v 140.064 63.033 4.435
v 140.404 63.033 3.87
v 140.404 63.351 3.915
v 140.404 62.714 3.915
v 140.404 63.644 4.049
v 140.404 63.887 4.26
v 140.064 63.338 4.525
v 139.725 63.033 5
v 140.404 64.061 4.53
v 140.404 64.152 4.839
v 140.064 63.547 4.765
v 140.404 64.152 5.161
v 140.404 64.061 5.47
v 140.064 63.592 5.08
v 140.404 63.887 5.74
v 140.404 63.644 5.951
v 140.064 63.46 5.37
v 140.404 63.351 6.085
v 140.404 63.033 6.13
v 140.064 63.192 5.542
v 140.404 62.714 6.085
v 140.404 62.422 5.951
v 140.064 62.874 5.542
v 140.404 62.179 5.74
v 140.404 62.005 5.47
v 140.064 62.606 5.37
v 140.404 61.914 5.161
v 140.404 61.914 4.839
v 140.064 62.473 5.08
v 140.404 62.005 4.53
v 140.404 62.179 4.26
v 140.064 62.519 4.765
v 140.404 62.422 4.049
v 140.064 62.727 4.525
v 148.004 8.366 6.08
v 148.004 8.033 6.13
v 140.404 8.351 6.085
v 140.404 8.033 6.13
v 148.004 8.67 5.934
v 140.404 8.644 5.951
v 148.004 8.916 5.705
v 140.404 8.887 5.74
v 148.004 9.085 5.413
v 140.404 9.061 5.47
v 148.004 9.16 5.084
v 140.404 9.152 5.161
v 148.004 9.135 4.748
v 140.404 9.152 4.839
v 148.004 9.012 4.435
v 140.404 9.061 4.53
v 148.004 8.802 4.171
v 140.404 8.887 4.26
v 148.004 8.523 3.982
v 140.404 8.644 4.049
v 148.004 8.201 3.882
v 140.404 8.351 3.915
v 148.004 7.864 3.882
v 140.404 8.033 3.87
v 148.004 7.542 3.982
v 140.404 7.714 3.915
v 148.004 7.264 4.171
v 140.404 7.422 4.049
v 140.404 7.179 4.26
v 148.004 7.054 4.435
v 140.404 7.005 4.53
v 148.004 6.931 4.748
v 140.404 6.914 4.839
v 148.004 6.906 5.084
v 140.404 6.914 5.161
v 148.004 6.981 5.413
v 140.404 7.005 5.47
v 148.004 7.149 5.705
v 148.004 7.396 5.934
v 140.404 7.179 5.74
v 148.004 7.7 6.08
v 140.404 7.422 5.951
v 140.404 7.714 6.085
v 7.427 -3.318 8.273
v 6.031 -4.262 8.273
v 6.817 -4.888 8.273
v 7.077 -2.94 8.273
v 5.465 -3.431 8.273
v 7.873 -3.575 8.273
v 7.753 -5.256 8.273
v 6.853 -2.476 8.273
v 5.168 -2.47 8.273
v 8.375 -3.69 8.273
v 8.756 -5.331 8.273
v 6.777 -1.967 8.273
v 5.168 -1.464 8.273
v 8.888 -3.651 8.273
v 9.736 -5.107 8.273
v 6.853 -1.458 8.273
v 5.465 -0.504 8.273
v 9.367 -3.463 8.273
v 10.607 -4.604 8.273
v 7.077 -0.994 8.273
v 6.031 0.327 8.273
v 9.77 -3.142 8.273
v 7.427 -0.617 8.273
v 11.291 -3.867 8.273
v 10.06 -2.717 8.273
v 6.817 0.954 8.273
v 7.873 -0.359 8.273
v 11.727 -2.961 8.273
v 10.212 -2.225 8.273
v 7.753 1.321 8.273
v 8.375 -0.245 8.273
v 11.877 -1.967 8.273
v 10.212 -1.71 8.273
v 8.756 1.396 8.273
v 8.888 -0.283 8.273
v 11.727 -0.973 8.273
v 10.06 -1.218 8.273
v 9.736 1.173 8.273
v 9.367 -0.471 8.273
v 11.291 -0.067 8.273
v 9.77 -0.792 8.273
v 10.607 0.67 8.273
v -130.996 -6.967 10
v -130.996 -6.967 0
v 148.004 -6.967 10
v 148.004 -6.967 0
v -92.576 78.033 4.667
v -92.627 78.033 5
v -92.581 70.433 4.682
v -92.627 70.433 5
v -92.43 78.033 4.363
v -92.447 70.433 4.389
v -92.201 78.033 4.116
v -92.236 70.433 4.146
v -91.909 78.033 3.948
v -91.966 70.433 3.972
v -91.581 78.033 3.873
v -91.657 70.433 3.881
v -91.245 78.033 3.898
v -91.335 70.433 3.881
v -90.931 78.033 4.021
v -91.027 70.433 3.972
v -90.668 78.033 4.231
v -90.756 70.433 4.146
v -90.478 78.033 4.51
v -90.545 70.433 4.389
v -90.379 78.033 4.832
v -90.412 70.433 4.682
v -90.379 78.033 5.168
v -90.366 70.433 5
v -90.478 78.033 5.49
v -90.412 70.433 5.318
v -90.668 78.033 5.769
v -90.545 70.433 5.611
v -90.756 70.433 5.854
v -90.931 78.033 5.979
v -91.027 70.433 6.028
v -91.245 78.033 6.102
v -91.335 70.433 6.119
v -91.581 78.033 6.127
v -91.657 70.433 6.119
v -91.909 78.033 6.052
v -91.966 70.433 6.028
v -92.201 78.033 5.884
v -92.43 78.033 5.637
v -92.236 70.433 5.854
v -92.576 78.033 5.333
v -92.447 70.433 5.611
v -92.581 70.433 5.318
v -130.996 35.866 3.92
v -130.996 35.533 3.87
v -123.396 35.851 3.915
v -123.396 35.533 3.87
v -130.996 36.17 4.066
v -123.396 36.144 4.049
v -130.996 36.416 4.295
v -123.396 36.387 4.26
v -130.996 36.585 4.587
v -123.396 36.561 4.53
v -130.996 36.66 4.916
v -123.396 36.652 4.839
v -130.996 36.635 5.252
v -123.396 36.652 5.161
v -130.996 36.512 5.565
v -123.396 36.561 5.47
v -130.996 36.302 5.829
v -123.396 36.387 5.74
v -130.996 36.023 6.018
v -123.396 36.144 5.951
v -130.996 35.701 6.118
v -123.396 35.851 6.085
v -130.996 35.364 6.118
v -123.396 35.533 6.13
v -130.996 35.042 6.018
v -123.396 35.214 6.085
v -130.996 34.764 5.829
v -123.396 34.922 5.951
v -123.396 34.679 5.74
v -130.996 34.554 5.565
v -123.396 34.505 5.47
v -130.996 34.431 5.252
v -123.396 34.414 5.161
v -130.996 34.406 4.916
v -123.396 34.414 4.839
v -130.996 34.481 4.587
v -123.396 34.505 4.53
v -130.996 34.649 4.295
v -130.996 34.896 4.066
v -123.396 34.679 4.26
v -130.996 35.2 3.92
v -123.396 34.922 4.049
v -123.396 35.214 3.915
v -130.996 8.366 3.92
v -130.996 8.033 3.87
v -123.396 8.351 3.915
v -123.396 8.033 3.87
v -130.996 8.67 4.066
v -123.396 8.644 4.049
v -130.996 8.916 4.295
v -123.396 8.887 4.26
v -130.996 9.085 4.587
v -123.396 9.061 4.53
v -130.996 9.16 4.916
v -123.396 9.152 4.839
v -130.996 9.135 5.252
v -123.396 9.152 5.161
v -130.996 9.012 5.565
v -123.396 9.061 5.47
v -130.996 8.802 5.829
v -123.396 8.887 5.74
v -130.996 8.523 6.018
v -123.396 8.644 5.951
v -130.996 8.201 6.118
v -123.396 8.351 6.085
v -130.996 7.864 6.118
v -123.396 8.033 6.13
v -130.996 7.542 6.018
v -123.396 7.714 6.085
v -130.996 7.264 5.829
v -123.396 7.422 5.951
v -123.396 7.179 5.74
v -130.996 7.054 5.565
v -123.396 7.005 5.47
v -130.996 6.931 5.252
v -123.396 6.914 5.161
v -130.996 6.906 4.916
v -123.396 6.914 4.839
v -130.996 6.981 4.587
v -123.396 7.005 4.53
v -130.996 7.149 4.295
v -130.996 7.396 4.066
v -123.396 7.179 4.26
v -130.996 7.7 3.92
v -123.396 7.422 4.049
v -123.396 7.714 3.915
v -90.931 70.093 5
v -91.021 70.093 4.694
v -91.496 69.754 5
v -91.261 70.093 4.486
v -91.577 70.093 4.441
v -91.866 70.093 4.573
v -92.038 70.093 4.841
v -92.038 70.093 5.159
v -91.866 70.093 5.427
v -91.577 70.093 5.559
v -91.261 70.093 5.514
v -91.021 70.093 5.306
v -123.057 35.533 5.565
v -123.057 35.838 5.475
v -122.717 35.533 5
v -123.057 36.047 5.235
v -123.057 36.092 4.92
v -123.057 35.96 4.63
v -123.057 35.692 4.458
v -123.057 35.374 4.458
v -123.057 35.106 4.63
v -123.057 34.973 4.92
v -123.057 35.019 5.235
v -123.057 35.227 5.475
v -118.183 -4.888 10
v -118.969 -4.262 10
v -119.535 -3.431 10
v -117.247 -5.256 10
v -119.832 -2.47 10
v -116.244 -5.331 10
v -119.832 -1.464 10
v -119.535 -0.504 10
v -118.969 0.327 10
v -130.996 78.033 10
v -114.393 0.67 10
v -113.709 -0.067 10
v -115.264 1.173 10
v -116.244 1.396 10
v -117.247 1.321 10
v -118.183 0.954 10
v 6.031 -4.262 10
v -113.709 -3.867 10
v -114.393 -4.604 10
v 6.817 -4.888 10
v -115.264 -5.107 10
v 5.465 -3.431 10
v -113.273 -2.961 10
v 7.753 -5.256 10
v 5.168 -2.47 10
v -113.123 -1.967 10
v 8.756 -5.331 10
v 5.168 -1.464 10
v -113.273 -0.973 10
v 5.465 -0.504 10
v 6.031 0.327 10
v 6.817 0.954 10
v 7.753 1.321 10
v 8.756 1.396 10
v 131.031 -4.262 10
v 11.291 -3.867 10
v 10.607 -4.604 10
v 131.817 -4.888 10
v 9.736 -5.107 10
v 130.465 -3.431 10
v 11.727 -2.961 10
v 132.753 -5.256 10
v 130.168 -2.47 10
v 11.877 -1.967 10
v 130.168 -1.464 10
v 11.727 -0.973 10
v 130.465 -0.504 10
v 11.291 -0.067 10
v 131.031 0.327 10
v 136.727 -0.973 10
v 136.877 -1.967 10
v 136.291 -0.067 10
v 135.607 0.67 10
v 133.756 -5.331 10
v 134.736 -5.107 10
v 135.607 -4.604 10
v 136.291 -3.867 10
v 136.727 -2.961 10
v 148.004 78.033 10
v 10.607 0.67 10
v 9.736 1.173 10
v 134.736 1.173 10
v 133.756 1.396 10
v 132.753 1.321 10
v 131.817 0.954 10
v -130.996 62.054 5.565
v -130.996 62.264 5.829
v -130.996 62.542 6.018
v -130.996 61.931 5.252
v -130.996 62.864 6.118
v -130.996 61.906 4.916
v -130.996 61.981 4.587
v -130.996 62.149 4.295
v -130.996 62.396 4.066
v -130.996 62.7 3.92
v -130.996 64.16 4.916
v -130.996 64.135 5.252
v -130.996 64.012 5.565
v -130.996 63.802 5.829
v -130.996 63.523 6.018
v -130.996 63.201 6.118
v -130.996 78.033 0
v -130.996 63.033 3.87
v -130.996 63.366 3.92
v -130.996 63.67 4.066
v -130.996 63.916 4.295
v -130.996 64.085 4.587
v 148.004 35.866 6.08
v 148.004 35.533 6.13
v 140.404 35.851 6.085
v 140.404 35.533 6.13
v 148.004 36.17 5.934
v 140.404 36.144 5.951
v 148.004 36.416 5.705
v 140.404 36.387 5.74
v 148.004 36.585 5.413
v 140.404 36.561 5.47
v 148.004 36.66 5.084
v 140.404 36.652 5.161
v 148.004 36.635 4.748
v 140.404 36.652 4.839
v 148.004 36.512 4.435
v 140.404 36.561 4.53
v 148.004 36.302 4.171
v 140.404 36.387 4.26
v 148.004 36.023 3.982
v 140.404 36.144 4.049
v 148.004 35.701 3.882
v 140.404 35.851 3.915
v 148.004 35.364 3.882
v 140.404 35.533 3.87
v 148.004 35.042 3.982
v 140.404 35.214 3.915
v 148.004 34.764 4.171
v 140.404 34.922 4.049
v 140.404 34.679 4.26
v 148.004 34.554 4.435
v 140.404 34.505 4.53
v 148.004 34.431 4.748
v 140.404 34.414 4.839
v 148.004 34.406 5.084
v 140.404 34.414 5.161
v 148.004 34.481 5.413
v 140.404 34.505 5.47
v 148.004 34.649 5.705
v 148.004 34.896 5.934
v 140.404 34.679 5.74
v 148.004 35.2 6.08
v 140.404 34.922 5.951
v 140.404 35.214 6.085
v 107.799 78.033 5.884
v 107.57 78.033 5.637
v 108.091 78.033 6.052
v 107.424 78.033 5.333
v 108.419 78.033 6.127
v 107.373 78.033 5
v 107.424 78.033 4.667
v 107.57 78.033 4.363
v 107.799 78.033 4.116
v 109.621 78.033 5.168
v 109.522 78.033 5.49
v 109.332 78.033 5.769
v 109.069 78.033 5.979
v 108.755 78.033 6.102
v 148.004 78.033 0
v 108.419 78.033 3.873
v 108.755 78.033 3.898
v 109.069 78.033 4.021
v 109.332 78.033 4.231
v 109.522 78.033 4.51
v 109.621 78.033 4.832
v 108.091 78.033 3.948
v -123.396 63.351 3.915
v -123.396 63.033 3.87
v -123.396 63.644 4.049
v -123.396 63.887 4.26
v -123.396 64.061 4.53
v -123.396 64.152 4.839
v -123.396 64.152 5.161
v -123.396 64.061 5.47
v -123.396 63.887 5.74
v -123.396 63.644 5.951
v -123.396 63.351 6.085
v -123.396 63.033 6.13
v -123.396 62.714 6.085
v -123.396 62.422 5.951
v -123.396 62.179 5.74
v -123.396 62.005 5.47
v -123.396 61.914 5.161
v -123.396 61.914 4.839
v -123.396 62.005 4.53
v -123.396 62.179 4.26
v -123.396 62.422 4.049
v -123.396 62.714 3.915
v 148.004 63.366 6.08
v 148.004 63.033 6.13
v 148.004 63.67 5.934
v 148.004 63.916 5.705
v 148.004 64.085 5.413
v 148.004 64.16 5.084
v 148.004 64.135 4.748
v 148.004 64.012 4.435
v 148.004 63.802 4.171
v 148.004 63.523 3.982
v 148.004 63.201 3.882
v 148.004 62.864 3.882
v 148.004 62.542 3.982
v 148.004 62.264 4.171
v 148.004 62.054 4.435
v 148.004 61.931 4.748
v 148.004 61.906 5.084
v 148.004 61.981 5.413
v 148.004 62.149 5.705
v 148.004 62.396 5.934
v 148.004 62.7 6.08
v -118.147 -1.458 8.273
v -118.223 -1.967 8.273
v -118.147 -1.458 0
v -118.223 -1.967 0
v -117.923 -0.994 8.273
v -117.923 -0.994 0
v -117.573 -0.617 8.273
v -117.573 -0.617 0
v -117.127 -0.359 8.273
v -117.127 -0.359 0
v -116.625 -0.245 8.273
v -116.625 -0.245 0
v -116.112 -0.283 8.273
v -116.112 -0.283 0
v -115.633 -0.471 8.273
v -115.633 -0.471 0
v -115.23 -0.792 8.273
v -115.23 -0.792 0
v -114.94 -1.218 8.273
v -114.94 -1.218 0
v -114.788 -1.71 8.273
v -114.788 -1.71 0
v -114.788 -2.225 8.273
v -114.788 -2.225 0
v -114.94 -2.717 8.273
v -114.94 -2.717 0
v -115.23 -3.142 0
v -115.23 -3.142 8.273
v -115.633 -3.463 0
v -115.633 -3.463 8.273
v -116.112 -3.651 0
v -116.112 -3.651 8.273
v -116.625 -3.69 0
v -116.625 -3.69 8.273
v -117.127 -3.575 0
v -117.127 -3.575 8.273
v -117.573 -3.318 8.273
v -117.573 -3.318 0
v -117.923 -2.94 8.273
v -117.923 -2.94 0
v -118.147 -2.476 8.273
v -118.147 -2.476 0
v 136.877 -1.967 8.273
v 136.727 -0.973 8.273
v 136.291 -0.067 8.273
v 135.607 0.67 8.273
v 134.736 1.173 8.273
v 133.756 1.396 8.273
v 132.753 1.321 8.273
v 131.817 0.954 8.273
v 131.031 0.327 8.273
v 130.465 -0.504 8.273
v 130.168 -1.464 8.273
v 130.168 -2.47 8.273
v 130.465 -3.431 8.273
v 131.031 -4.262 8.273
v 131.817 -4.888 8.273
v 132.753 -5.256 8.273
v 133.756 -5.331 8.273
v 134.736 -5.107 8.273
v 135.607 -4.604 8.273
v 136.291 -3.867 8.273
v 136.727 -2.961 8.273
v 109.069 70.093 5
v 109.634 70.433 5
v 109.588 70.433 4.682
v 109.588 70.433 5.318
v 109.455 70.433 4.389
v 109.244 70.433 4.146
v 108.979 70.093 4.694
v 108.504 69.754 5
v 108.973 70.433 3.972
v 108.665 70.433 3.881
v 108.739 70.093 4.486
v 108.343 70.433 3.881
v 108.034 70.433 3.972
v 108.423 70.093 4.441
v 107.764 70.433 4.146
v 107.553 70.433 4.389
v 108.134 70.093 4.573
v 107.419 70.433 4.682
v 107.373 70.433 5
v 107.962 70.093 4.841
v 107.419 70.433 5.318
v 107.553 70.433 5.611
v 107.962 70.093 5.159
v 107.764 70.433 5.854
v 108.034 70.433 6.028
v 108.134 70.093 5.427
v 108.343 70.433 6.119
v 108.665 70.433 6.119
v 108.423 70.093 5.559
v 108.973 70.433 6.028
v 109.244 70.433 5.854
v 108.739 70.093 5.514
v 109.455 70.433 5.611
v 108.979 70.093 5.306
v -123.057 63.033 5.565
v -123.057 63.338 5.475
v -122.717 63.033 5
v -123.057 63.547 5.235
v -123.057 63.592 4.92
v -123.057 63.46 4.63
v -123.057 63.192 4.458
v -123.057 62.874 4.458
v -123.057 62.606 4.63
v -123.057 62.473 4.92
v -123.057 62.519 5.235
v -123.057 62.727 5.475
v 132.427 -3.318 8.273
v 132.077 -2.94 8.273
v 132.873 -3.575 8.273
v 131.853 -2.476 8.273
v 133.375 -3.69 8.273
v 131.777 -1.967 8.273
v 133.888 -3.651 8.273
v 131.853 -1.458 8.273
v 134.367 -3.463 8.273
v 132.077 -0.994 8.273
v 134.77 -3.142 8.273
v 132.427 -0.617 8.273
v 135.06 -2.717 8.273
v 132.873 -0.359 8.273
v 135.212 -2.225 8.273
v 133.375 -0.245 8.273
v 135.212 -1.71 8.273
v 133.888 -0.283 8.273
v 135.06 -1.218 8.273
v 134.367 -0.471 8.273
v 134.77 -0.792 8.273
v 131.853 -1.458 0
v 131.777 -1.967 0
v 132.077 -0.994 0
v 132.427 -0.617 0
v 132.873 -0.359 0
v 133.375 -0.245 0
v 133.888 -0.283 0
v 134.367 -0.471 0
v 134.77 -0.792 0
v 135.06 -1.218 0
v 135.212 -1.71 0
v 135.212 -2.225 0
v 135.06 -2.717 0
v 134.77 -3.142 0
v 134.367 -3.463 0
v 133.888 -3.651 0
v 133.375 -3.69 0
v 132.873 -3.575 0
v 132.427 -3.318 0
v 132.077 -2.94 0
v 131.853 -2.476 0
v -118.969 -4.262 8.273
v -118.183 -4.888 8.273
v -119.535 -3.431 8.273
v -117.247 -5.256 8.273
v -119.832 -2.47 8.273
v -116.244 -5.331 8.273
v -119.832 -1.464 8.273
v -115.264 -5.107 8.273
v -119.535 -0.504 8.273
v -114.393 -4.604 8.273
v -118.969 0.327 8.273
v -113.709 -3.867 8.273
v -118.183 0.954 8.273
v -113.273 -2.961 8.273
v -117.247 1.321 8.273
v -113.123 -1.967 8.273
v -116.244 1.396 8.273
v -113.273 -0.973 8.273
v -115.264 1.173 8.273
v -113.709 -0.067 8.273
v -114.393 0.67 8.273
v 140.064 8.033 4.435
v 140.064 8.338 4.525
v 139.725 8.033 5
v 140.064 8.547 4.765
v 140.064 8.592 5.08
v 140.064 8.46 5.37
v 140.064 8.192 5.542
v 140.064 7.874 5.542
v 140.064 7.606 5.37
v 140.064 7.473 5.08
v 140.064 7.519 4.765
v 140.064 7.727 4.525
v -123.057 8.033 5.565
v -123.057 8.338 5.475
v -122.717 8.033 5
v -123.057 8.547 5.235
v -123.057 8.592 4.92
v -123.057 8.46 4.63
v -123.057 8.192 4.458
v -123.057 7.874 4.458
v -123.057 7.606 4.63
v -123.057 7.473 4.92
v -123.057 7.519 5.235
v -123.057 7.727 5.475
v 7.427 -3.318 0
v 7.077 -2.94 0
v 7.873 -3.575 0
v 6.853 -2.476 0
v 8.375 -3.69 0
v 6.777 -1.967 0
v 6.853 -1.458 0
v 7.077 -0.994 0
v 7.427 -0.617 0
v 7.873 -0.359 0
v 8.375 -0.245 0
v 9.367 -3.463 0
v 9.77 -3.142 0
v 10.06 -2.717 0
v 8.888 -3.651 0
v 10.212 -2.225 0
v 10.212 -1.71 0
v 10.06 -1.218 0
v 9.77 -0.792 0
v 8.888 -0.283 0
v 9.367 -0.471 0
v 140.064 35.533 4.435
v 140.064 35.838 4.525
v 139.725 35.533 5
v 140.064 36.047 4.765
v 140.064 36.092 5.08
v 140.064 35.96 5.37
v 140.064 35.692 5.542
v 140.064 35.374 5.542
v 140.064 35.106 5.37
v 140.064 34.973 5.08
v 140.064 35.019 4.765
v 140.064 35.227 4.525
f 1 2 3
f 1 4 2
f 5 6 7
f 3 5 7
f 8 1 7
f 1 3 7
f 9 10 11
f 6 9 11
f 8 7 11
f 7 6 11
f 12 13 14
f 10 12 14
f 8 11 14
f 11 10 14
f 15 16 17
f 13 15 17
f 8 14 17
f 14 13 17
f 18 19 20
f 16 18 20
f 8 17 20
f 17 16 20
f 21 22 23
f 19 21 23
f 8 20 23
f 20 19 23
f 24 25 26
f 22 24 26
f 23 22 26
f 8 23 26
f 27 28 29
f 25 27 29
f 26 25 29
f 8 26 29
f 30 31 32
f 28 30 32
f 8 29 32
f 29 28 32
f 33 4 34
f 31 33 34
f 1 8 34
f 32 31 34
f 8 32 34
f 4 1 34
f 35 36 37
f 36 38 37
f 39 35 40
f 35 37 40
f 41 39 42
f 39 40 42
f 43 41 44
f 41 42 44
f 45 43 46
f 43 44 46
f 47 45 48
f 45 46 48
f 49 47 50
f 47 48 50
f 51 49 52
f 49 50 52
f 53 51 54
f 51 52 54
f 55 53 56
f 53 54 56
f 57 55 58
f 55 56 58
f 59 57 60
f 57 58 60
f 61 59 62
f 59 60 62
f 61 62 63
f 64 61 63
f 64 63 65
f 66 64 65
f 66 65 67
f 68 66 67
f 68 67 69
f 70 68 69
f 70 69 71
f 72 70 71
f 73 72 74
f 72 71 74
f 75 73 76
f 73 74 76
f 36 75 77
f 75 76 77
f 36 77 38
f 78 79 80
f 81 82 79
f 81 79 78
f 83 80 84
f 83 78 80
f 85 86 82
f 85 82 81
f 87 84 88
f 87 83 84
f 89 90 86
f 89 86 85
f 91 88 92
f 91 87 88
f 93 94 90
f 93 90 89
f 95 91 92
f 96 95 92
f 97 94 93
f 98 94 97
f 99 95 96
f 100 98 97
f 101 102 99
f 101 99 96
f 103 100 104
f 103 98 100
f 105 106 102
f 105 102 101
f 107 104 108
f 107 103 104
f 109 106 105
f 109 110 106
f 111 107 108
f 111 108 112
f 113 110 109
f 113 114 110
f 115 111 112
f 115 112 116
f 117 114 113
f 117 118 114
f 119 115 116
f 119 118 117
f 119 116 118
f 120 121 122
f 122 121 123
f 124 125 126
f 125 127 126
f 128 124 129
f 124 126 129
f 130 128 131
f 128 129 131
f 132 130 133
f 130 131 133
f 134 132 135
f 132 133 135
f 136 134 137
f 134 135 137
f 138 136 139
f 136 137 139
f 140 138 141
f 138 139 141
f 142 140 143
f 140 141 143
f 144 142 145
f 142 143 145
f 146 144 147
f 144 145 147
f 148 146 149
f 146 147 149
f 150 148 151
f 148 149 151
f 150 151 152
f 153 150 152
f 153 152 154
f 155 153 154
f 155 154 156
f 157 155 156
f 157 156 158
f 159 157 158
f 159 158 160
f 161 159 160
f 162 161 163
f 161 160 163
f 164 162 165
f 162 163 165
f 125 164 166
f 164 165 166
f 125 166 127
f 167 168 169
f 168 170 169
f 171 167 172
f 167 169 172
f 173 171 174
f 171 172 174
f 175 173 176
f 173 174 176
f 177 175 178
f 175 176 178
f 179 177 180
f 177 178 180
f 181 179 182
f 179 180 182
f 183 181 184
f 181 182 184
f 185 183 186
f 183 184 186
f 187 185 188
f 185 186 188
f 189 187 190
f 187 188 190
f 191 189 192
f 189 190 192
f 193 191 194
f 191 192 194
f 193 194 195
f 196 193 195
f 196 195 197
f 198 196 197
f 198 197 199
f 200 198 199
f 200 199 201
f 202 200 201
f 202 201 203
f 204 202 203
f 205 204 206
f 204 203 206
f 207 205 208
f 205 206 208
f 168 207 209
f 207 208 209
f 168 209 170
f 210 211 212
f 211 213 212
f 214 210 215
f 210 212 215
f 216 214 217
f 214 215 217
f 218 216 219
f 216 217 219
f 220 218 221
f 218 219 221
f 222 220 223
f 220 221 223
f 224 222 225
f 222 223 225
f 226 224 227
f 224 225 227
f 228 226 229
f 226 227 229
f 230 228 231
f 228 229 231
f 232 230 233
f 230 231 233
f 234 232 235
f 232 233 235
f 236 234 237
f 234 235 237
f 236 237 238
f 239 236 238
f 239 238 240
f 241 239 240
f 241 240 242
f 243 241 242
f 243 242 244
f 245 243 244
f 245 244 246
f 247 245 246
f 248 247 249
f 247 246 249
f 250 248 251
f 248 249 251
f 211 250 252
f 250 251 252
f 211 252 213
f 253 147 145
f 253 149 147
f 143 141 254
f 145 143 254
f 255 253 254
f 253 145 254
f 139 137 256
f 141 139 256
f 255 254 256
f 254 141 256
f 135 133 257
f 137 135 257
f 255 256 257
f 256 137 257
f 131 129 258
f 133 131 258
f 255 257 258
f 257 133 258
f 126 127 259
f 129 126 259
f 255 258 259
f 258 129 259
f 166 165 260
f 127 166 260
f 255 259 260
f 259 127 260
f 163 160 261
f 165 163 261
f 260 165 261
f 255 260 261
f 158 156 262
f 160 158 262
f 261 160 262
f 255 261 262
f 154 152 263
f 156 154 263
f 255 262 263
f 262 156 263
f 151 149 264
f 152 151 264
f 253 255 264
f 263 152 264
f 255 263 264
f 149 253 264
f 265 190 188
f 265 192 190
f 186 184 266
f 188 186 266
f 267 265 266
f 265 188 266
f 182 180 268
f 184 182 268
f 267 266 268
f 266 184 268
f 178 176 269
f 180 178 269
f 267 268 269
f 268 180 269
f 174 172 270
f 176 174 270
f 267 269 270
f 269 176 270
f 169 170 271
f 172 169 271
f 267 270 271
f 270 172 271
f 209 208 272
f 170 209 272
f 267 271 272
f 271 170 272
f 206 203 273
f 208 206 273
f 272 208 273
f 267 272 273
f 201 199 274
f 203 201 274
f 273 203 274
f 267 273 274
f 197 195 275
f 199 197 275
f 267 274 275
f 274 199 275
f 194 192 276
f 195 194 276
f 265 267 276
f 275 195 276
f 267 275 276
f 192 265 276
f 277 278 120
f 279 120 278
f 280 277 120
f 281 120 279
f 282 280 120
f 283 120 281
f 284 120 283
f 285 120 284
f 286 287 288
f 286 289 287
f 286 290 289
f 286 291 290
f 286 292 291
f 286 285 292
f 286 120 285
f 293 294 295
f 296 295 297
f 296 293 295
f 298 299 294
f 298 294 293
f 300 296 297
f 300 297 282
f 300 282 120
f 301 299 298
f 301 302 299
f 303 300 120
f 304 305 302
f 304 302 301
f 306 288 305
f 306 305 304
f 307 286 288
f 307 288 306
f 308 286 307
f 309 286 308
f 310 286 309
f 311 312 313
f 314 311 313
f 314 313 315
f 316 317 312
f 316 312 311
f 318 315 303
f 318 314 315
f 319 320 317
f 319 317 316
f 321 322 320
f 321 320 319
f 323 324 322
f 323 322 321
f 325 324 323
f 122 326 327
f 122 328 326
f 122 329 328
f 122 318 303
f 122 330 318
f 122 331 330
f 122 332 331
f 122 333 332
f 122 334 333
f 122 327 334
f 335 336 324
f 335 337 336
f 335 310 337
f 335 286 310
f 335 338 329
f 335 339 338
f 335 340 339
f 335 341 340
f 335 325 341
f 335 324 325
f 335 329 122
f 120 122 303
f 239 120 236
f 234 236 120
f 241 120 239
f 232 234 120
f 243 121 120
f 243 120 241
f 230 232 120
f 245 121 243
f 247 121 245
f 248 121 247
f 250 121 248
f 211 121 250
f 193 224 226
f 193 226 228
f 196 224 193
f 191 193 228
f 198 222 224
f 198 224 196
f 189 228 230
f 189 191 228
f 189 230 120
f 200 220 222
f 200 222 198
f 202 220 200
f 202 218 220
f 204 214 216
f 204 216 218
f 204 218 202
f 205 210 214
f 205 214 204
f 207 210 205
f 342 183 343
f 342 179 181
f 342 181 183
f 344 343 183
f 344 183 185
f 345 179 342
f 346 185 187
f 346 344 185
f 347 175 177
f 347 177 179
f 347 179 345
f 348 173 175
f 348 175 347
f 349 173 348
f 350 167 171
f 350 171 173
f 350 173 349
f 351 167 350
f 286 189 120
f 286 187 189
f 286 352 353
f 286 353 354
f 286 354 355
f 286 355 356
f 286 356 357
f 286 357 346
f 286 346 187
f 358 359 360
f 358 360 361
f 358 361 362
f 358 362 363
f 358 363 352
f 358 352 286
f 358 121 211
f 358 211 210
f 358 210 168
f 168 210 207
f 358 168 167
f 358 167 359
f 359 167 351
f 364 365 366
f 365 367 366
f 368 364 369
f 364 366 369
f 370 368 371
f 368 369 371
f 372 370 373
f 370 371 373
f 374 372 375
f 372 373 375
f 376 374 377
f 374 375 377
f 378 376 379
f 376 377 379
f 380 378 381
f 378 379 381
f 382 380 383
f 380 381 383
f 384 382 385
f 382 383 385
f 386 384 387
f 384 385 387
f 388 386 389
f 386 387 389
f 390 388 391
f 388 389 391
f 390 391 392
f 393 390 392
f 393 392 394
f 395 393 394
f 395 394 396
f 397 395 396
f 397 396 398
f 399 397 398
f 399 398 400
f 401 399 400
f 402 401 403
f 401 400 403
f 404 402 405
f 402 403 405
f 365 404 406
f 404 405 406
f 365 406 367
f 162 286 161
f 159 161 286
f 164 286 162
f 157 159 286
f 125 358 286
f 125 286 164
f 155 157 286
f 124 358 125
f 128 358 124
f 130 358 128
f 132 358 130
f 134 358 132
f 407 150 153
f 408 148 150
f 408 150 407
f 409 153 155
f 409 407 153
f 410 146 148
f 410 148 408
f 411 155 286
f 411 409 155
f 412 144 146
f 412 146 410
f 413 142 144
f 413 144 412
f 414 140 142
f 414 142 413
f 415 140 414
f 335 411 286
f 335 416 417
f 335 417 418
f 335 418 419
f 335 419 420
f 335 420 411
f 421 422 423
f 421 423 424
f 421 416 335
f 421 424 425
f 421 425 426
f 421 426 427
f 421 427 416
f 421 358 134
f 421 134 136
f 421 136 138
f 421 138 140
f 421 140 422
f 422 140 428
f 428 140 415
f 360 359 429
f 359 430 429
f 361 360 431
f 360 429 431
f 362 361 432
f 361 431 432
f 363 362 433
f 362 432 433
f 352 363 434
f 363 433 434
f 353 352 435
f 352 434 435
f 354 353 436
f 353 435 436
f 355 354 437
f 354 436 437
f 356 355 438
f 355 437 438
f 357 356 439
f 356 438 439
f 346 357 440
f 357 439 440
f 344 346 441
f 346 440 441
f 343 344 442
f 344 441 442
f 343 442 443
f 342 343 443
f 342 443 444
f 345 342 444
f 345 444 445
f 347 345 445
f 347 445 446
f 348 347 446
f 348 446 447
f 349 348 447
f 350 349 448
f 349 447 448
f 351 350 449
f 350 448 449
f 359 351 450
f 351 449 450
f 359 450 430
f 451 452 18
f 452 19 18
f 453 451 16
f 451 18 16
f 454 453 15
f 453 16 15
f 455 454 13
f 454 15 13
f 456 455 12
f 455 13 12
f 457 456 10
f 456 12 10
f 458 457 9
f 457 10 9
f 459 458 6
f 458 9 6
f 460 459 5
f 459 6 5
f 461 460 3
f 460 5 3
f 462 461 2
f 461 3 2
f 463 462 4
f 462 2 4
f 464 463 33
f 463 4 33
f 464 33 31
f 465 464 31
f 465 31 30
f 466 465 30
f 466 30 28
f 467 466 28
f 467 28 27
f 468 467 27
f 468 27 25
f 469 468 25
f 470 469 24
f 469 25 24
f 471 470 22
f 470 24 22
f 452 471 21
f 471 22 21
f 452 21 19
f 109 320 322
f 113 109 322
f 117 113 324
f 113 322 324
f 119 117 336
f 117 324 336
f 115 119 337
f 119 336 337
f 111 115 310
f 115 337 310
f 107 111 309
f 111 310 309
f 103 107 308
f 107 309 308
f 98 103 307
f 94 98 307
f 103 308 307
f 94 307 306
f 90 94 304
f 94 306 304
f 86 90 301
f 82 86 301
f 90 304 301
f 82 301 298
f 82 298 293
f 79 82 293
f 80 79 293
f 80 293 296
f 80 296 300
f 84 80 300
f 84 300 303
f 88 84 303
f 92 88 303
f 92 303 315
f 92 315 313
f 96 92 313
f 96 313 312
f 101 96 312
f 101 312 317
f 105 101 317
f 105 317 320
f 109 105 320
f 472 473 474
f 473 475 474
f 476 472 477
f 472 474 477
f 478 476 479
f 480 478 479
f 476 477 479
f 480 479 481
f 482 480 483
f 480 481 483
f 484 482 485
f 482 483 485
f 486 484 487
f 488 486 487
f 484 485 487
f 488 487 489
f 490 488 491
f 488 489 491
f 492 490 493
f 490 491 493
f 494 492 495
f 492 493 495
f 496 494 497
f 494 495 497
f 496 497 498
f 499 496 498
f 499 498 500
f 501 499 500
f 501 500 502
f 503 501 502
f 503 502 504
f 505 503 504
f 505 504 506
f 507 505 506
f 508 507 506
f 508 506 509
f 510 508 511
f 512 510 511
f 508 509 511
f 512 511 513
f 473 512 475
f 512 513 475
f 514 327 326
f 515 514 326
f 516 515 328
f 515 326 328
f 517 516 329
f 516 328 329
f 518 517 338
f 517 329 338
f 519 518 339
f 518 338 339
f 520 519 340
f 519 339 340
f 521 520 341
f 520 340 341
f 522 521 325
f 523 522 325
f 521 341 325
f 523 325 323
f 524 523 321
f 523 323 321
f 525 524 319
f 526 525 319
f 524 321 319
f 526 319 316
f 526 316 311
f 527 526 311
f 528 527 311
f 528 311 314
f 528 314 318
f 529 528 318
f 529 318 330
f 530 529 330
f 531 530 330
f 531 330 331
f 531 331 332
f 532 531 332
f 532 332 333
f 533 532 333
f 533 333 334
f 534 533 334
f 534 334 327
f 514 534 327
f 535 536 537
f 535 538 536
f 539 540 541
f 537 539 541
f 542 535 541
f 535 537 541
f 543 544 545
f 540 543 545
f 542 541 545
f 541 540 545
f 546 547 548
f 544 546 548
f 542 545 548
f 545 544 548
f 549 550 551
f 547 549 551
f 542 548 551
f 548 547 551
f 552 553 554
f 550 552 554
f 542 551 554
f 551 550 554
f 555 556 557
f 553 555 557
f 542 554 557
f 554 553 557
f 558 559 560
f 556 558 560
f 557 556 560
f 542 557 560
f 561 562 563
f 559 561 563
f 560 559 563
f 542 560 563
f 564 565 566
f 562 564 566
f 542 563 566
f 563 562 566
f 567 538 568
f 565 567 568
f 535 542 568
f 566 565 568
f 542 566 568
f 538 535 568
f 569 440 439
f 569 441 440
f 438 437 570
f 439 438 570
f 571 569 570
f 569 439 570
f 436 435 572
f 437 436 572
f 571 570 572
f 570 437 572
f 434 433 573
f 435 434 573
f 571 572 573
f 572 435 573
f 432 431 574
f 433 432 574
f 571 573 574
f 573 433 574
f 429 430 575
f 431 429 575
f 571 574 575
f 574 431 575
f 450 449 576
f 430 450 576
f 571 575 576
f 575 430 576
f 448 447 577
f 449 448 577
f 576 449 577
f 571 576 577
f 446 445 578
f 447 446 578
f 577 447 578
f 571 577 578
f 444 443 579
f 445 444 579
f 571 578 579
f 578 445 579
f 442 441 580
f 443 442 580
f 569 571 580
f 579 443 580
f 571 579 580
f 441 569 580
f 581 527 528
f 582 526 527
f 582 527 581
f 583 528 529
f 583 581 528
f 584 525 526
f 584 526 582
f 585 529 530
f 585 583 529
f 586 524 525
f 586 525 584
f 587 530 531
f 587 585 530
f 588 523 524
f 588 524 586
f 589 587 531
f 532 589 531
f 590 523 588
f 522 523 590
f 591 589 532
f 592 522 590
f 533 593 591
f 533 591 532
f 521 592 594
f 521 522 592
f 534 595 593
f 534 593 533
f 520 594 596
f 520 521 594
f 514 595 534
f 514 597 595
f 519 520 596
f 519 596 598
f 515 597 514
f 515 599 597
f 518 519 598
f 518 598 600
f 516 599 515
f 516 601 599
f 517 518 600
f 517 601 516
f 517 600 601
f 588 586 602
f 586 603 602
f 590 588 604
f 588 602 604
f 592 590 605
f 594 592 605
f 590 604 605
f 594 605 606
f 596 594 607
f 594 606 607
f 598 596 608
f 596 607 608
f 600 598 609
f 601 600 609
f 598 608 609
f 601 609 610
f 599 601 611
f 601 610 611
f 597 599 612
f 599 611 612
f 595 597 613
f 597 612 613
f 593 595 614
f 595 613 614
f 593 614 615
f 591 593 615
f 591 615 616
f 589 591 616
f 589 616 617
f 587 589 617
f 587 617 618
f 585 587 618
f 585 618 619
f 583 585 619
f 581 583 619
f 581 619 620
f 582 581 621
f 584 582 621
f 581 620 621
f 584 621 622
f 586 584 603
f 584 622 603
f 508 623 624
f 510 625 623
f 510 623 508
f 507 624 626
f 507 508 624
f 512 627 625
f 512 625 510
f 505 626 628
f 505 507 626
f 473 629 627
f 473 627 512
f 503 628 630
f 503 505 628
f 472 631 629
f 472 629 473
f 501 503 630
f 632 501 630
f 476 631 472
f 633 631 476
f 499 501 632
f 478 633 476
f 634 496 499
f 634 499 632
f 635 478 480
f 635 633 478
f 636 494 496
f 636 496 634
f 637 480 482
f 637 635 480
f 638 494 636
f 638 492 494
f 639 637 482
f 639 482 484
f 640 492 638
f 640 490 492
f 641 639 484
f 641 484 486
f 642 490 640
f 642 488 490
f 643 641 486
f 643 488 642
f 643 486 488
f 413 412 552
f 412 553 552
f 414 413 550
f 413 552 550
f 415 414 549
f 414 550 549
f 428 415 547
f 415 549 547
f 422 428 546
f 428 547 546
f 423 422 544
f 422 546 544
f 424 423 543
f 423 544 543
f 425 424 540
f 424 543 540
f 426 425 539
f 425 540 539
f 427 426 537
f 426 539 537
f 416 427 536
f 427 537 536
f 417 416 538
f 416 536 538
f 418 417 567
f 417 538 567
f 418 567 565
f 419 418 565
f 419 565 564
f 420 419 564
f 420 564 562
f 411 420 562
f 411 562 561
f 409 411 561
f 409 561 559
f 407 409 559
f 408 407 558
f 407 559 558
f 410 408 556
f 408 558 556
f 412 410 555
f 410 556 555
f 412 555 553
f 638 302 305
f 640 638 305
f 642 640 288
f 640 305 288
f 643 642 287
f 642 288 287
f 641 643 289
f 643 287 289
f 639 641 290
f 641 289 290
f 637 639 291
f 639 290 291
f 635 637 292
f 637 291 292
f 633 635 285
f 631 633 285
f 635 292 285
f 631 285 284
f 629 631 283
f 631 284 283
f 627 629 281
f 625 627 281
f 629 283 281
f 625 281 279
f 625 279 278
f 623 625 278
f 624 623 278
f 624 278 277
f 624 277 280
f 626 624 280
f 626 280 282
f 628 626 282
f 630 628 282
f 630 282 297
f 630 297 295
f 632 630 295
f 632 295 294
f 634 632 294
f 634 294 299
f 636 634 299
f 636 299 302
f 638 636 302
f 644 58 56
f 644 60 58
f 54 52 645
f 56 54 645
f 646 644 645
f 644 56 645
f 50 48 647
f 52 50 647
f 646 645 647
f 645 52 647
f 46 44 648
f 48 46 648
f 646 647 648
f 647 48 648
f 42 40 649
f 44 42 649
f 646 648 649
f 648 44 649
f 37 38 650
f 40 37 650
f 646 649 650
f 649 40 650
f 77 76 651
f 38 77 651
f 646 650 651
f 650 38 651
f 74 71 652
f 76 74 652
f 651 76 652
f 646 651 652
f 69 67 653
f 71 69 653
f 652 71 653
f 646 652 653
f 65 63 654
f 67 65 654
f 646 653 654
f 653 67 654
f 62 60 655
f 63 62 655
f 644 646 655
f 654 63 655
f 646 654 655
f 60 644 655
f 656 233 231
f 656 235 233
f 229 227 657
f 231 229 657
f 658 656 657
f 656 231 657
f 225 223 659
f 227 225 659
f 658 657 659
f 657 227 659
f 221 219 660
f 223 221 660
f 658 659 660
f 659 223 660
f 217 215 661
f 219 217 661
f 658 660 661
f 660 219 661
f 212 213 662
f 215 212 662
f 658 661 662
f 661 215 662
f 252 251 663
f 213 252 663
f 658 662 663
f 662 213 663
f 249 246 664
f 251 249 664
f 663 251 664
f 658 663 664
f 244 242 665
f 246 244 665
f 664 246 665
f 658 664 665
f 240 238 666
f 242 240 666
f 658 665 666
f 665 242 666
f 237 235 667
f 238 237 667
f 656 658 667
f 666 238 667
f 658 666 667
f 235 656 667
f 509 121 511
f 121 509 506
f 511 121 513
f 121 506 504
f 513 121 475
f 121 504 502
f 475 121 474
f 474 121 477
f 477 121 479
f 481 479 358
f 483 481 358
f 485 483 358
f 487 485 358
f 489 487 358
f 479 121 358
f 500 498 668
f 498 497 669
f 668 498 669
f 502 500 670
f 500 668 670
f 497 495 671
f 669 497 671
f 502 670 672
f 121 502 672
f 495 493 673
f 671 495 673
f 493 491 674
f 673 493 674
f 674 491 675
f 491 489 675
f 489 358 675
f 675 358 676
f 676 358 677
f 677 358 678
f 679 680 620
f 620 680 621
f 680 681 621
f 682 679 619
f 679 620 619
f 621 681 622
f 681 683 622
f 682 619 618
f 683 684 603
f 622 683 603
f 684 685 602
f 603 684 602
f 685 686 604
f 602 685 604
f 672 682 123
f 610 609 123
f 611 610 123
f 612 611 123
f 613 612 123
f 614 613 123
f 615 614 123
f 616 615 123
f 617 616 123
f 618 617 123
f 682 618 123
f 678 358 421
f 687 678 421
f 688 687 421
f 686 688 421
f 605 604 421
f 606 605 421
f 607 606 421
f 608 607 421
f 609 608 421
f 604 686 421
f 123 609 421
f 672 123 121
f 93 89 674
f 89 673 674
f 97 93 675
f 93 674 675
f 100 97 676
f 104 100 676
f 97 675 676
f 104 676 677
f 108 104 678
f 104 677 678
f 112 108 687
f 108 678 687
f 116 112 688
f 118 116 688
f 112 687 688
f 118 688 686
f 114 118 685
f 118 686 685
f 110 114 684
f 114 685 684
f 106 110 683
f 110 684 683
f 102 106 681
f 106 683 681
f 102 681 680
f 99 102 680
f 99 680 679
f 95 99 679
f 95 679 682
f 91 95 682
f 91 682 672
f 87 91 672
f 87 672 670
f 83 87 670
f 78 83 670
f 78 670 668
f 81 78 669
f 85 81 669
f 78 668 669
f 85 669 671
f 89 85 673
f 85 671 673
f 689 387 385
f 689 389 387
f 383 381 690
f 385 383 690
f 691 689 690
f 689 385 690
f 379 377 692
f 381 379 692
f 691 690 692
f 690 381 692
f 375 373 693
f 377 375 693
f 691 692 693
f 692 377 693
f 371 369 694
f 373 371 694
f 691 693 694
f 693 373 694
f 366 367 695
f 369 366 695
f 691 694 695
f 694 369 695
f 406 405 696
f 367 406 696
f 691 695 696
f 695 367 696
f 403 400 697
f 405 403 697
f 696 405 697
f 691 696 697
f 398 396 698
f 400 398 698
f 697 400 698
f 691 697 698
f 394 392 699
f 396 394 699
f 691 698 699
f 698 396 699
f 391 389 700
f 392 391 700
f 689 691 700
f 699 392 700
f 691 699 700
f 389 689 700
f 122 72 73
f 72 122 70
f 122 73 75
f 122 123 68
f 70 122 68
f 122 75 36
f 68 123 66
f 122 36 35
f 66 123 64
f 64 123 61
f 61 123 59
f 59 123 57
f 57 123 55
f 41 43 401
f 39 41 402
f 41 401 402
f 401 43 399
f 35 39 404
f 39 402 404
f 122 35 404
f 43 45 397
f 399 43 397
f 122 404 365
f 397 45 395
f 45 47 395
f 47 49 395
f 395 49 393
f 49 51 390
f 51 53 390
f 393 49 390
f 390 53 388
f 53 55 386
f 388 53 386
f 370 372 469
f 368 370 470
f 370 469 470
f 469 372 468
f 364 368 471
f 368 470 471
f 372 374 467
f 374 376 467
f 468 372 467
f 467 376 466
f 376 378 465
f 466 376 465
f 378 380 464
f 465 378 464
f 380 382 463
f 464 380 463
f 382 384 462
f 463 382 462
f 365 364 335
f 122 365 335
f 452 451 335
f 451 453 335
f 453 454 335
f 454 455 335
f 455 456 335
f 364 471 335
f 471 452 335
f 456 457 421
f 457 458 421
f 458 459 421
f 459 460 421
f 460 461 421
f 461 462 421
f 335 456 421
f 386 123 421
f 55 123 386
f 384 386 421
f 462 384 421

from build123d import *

# Parameters (mm, degrees)
SKETCH1_W                                           = 279
SKETCH1_H                                           = 85
BOSS_EXTRUDE1_DEPTH                                 = 10
CBORE_FOR_4_BINDING_HEAD_MACHINE_SCREW1_D           = 3.4544
CBORE_FOR_4_BINDING_HEAD_MACHINE_SCREW1_CBORE_D     = 6.74624
CBORE_FOR_4_BINDING_HEAD_MACHINE_SCREW1_CBORE_DEPTH = 1.7272
F_4_40_TAPPED_HOLE1_D                               = 2.2606
F_4_40_TAPPED_HOLE1_DEPTH                           = 7.6
F_4_40_TAPPED_HOLE1_TIP                             = 0.679152758
F_4_40_TAPPED_HOLE2_D                               = 2.2606
F_4_40_TAPPED_HOLE2_DEPTH                           = 7.6
F_4_40_TAPPED_HOLE2_TIP                             = 0.679152758
F_4_40_TAPPED_HOLE3_D                               = 2.2606
F_4_40_TAPPED_HOLE3_DEPTH                           = 7.6
F_4_40_TAPPED_HOLE3_TIP                             = 0.679152758


with BuildPart() as part:
    # Sketch1 → Boss-Extrude1 (new body)
    with BuildSketch(Plane.XY):
        with Locations((8.503783102, 35.532786885)):
            Rectangle(SKETCH1_W, SKETCH1_H)
    extrude(amount=BOSS_EXTRUDE1_DEPTH)

    # CBORE for #4 Binding Head Machine Screw1 (through all)
    with Locations(Plane.XY.offset(10)):
        with Locations((-116.496216898, -1.967213115), (8.503783102, -1.967213115), (133.503783102, -1.967213115)):
            CounterBoreHole(CBORE_FOR_4_BINDING_HEAD_MACHINE_SCREW1_D / 2, CBORE_FOR_4_BINDING_HEAD_MACHINE_SCREW1_CBORE_D / 2, CBORE_FOR_4_BINDING_HEAD_MACHINE_SCREW1_CBORE_DEPTH)

    # #4-40 Tapped Hole1
    with Locations(Plane.ZY.offset(130.996216898)):
        with Locations((5, 63.032786885), (5, 35.532786885), (5, 8.032786885)):
            Hole(F_4_40_TAPPED_HOLE1_D / 2, depth=F_4_40_TAPPED_HOLE1_DEPTH)
            with Locations((0, 0, -(F_4_40_TAPPED_HOLE1_DEPTH + F_4_40_TAPPED_HOLE1_TIP / 2))):  # 118° drill point
                Cone(0, F_4_40_TAPPED_HOLE1_D / 2, F_4_40_TAPPED_HOLE1_TIP, mode=Mode.SUBTRACT)

    # #4-40 Tapped Hole2
    with Locations(Plane(origin=(148.003783102, 0, 0), x_dir=(0, 0, -1), z_dir=(1, 0, 0))):
        with Locations((-5, 63.032786885), (-5, 35.532786885), (-5, 8.032786885)):
            Hole(F_4_40_TAPPED_HOLE2_D / 2, depth=F_4_40_TAPPED_HOLE2_DEPTH)
            with Locations((0, 0, -(F_4_40_TAPPED_HOLE2_DEPTH + F_4_40_TAPPED_HOLE2_TIP / 2))):  # 118° drill point
                Cone(0, F_4_40_TAPPED_HOLE2_D / 2, F_4_40_TAPPED_HOLE2_TIP, mode=Mode.SUBTRACT)

    # #4-40 Tapped Hole3
    with Locations(Plane(origin=(0, 78.032786885, 0), x_dir=(1, 0, 0), z_dir=(0, 1, 0))):
        with Locations((-91.496216898, -5), (108.503783102, -5)):
            Hole(F_4_40_TAPPED_HOLE3_D / 2, depth=F_4_40_TAPPED_HOLE3_DEPTH)
            with Locations((0, 0, -(F_4_40_TAPPED_HOLE3_DEPTH + F_4_40_TAPPED_HOLE3_TIP / 2))):  # 118° drill point
                Cone(0, F_4_40_TAPPED_HOLE3_D / 2, F_4_40_TAPPED_HOLE3_TIP, mode=Mode.SUBTRACT)


solid = part.part
